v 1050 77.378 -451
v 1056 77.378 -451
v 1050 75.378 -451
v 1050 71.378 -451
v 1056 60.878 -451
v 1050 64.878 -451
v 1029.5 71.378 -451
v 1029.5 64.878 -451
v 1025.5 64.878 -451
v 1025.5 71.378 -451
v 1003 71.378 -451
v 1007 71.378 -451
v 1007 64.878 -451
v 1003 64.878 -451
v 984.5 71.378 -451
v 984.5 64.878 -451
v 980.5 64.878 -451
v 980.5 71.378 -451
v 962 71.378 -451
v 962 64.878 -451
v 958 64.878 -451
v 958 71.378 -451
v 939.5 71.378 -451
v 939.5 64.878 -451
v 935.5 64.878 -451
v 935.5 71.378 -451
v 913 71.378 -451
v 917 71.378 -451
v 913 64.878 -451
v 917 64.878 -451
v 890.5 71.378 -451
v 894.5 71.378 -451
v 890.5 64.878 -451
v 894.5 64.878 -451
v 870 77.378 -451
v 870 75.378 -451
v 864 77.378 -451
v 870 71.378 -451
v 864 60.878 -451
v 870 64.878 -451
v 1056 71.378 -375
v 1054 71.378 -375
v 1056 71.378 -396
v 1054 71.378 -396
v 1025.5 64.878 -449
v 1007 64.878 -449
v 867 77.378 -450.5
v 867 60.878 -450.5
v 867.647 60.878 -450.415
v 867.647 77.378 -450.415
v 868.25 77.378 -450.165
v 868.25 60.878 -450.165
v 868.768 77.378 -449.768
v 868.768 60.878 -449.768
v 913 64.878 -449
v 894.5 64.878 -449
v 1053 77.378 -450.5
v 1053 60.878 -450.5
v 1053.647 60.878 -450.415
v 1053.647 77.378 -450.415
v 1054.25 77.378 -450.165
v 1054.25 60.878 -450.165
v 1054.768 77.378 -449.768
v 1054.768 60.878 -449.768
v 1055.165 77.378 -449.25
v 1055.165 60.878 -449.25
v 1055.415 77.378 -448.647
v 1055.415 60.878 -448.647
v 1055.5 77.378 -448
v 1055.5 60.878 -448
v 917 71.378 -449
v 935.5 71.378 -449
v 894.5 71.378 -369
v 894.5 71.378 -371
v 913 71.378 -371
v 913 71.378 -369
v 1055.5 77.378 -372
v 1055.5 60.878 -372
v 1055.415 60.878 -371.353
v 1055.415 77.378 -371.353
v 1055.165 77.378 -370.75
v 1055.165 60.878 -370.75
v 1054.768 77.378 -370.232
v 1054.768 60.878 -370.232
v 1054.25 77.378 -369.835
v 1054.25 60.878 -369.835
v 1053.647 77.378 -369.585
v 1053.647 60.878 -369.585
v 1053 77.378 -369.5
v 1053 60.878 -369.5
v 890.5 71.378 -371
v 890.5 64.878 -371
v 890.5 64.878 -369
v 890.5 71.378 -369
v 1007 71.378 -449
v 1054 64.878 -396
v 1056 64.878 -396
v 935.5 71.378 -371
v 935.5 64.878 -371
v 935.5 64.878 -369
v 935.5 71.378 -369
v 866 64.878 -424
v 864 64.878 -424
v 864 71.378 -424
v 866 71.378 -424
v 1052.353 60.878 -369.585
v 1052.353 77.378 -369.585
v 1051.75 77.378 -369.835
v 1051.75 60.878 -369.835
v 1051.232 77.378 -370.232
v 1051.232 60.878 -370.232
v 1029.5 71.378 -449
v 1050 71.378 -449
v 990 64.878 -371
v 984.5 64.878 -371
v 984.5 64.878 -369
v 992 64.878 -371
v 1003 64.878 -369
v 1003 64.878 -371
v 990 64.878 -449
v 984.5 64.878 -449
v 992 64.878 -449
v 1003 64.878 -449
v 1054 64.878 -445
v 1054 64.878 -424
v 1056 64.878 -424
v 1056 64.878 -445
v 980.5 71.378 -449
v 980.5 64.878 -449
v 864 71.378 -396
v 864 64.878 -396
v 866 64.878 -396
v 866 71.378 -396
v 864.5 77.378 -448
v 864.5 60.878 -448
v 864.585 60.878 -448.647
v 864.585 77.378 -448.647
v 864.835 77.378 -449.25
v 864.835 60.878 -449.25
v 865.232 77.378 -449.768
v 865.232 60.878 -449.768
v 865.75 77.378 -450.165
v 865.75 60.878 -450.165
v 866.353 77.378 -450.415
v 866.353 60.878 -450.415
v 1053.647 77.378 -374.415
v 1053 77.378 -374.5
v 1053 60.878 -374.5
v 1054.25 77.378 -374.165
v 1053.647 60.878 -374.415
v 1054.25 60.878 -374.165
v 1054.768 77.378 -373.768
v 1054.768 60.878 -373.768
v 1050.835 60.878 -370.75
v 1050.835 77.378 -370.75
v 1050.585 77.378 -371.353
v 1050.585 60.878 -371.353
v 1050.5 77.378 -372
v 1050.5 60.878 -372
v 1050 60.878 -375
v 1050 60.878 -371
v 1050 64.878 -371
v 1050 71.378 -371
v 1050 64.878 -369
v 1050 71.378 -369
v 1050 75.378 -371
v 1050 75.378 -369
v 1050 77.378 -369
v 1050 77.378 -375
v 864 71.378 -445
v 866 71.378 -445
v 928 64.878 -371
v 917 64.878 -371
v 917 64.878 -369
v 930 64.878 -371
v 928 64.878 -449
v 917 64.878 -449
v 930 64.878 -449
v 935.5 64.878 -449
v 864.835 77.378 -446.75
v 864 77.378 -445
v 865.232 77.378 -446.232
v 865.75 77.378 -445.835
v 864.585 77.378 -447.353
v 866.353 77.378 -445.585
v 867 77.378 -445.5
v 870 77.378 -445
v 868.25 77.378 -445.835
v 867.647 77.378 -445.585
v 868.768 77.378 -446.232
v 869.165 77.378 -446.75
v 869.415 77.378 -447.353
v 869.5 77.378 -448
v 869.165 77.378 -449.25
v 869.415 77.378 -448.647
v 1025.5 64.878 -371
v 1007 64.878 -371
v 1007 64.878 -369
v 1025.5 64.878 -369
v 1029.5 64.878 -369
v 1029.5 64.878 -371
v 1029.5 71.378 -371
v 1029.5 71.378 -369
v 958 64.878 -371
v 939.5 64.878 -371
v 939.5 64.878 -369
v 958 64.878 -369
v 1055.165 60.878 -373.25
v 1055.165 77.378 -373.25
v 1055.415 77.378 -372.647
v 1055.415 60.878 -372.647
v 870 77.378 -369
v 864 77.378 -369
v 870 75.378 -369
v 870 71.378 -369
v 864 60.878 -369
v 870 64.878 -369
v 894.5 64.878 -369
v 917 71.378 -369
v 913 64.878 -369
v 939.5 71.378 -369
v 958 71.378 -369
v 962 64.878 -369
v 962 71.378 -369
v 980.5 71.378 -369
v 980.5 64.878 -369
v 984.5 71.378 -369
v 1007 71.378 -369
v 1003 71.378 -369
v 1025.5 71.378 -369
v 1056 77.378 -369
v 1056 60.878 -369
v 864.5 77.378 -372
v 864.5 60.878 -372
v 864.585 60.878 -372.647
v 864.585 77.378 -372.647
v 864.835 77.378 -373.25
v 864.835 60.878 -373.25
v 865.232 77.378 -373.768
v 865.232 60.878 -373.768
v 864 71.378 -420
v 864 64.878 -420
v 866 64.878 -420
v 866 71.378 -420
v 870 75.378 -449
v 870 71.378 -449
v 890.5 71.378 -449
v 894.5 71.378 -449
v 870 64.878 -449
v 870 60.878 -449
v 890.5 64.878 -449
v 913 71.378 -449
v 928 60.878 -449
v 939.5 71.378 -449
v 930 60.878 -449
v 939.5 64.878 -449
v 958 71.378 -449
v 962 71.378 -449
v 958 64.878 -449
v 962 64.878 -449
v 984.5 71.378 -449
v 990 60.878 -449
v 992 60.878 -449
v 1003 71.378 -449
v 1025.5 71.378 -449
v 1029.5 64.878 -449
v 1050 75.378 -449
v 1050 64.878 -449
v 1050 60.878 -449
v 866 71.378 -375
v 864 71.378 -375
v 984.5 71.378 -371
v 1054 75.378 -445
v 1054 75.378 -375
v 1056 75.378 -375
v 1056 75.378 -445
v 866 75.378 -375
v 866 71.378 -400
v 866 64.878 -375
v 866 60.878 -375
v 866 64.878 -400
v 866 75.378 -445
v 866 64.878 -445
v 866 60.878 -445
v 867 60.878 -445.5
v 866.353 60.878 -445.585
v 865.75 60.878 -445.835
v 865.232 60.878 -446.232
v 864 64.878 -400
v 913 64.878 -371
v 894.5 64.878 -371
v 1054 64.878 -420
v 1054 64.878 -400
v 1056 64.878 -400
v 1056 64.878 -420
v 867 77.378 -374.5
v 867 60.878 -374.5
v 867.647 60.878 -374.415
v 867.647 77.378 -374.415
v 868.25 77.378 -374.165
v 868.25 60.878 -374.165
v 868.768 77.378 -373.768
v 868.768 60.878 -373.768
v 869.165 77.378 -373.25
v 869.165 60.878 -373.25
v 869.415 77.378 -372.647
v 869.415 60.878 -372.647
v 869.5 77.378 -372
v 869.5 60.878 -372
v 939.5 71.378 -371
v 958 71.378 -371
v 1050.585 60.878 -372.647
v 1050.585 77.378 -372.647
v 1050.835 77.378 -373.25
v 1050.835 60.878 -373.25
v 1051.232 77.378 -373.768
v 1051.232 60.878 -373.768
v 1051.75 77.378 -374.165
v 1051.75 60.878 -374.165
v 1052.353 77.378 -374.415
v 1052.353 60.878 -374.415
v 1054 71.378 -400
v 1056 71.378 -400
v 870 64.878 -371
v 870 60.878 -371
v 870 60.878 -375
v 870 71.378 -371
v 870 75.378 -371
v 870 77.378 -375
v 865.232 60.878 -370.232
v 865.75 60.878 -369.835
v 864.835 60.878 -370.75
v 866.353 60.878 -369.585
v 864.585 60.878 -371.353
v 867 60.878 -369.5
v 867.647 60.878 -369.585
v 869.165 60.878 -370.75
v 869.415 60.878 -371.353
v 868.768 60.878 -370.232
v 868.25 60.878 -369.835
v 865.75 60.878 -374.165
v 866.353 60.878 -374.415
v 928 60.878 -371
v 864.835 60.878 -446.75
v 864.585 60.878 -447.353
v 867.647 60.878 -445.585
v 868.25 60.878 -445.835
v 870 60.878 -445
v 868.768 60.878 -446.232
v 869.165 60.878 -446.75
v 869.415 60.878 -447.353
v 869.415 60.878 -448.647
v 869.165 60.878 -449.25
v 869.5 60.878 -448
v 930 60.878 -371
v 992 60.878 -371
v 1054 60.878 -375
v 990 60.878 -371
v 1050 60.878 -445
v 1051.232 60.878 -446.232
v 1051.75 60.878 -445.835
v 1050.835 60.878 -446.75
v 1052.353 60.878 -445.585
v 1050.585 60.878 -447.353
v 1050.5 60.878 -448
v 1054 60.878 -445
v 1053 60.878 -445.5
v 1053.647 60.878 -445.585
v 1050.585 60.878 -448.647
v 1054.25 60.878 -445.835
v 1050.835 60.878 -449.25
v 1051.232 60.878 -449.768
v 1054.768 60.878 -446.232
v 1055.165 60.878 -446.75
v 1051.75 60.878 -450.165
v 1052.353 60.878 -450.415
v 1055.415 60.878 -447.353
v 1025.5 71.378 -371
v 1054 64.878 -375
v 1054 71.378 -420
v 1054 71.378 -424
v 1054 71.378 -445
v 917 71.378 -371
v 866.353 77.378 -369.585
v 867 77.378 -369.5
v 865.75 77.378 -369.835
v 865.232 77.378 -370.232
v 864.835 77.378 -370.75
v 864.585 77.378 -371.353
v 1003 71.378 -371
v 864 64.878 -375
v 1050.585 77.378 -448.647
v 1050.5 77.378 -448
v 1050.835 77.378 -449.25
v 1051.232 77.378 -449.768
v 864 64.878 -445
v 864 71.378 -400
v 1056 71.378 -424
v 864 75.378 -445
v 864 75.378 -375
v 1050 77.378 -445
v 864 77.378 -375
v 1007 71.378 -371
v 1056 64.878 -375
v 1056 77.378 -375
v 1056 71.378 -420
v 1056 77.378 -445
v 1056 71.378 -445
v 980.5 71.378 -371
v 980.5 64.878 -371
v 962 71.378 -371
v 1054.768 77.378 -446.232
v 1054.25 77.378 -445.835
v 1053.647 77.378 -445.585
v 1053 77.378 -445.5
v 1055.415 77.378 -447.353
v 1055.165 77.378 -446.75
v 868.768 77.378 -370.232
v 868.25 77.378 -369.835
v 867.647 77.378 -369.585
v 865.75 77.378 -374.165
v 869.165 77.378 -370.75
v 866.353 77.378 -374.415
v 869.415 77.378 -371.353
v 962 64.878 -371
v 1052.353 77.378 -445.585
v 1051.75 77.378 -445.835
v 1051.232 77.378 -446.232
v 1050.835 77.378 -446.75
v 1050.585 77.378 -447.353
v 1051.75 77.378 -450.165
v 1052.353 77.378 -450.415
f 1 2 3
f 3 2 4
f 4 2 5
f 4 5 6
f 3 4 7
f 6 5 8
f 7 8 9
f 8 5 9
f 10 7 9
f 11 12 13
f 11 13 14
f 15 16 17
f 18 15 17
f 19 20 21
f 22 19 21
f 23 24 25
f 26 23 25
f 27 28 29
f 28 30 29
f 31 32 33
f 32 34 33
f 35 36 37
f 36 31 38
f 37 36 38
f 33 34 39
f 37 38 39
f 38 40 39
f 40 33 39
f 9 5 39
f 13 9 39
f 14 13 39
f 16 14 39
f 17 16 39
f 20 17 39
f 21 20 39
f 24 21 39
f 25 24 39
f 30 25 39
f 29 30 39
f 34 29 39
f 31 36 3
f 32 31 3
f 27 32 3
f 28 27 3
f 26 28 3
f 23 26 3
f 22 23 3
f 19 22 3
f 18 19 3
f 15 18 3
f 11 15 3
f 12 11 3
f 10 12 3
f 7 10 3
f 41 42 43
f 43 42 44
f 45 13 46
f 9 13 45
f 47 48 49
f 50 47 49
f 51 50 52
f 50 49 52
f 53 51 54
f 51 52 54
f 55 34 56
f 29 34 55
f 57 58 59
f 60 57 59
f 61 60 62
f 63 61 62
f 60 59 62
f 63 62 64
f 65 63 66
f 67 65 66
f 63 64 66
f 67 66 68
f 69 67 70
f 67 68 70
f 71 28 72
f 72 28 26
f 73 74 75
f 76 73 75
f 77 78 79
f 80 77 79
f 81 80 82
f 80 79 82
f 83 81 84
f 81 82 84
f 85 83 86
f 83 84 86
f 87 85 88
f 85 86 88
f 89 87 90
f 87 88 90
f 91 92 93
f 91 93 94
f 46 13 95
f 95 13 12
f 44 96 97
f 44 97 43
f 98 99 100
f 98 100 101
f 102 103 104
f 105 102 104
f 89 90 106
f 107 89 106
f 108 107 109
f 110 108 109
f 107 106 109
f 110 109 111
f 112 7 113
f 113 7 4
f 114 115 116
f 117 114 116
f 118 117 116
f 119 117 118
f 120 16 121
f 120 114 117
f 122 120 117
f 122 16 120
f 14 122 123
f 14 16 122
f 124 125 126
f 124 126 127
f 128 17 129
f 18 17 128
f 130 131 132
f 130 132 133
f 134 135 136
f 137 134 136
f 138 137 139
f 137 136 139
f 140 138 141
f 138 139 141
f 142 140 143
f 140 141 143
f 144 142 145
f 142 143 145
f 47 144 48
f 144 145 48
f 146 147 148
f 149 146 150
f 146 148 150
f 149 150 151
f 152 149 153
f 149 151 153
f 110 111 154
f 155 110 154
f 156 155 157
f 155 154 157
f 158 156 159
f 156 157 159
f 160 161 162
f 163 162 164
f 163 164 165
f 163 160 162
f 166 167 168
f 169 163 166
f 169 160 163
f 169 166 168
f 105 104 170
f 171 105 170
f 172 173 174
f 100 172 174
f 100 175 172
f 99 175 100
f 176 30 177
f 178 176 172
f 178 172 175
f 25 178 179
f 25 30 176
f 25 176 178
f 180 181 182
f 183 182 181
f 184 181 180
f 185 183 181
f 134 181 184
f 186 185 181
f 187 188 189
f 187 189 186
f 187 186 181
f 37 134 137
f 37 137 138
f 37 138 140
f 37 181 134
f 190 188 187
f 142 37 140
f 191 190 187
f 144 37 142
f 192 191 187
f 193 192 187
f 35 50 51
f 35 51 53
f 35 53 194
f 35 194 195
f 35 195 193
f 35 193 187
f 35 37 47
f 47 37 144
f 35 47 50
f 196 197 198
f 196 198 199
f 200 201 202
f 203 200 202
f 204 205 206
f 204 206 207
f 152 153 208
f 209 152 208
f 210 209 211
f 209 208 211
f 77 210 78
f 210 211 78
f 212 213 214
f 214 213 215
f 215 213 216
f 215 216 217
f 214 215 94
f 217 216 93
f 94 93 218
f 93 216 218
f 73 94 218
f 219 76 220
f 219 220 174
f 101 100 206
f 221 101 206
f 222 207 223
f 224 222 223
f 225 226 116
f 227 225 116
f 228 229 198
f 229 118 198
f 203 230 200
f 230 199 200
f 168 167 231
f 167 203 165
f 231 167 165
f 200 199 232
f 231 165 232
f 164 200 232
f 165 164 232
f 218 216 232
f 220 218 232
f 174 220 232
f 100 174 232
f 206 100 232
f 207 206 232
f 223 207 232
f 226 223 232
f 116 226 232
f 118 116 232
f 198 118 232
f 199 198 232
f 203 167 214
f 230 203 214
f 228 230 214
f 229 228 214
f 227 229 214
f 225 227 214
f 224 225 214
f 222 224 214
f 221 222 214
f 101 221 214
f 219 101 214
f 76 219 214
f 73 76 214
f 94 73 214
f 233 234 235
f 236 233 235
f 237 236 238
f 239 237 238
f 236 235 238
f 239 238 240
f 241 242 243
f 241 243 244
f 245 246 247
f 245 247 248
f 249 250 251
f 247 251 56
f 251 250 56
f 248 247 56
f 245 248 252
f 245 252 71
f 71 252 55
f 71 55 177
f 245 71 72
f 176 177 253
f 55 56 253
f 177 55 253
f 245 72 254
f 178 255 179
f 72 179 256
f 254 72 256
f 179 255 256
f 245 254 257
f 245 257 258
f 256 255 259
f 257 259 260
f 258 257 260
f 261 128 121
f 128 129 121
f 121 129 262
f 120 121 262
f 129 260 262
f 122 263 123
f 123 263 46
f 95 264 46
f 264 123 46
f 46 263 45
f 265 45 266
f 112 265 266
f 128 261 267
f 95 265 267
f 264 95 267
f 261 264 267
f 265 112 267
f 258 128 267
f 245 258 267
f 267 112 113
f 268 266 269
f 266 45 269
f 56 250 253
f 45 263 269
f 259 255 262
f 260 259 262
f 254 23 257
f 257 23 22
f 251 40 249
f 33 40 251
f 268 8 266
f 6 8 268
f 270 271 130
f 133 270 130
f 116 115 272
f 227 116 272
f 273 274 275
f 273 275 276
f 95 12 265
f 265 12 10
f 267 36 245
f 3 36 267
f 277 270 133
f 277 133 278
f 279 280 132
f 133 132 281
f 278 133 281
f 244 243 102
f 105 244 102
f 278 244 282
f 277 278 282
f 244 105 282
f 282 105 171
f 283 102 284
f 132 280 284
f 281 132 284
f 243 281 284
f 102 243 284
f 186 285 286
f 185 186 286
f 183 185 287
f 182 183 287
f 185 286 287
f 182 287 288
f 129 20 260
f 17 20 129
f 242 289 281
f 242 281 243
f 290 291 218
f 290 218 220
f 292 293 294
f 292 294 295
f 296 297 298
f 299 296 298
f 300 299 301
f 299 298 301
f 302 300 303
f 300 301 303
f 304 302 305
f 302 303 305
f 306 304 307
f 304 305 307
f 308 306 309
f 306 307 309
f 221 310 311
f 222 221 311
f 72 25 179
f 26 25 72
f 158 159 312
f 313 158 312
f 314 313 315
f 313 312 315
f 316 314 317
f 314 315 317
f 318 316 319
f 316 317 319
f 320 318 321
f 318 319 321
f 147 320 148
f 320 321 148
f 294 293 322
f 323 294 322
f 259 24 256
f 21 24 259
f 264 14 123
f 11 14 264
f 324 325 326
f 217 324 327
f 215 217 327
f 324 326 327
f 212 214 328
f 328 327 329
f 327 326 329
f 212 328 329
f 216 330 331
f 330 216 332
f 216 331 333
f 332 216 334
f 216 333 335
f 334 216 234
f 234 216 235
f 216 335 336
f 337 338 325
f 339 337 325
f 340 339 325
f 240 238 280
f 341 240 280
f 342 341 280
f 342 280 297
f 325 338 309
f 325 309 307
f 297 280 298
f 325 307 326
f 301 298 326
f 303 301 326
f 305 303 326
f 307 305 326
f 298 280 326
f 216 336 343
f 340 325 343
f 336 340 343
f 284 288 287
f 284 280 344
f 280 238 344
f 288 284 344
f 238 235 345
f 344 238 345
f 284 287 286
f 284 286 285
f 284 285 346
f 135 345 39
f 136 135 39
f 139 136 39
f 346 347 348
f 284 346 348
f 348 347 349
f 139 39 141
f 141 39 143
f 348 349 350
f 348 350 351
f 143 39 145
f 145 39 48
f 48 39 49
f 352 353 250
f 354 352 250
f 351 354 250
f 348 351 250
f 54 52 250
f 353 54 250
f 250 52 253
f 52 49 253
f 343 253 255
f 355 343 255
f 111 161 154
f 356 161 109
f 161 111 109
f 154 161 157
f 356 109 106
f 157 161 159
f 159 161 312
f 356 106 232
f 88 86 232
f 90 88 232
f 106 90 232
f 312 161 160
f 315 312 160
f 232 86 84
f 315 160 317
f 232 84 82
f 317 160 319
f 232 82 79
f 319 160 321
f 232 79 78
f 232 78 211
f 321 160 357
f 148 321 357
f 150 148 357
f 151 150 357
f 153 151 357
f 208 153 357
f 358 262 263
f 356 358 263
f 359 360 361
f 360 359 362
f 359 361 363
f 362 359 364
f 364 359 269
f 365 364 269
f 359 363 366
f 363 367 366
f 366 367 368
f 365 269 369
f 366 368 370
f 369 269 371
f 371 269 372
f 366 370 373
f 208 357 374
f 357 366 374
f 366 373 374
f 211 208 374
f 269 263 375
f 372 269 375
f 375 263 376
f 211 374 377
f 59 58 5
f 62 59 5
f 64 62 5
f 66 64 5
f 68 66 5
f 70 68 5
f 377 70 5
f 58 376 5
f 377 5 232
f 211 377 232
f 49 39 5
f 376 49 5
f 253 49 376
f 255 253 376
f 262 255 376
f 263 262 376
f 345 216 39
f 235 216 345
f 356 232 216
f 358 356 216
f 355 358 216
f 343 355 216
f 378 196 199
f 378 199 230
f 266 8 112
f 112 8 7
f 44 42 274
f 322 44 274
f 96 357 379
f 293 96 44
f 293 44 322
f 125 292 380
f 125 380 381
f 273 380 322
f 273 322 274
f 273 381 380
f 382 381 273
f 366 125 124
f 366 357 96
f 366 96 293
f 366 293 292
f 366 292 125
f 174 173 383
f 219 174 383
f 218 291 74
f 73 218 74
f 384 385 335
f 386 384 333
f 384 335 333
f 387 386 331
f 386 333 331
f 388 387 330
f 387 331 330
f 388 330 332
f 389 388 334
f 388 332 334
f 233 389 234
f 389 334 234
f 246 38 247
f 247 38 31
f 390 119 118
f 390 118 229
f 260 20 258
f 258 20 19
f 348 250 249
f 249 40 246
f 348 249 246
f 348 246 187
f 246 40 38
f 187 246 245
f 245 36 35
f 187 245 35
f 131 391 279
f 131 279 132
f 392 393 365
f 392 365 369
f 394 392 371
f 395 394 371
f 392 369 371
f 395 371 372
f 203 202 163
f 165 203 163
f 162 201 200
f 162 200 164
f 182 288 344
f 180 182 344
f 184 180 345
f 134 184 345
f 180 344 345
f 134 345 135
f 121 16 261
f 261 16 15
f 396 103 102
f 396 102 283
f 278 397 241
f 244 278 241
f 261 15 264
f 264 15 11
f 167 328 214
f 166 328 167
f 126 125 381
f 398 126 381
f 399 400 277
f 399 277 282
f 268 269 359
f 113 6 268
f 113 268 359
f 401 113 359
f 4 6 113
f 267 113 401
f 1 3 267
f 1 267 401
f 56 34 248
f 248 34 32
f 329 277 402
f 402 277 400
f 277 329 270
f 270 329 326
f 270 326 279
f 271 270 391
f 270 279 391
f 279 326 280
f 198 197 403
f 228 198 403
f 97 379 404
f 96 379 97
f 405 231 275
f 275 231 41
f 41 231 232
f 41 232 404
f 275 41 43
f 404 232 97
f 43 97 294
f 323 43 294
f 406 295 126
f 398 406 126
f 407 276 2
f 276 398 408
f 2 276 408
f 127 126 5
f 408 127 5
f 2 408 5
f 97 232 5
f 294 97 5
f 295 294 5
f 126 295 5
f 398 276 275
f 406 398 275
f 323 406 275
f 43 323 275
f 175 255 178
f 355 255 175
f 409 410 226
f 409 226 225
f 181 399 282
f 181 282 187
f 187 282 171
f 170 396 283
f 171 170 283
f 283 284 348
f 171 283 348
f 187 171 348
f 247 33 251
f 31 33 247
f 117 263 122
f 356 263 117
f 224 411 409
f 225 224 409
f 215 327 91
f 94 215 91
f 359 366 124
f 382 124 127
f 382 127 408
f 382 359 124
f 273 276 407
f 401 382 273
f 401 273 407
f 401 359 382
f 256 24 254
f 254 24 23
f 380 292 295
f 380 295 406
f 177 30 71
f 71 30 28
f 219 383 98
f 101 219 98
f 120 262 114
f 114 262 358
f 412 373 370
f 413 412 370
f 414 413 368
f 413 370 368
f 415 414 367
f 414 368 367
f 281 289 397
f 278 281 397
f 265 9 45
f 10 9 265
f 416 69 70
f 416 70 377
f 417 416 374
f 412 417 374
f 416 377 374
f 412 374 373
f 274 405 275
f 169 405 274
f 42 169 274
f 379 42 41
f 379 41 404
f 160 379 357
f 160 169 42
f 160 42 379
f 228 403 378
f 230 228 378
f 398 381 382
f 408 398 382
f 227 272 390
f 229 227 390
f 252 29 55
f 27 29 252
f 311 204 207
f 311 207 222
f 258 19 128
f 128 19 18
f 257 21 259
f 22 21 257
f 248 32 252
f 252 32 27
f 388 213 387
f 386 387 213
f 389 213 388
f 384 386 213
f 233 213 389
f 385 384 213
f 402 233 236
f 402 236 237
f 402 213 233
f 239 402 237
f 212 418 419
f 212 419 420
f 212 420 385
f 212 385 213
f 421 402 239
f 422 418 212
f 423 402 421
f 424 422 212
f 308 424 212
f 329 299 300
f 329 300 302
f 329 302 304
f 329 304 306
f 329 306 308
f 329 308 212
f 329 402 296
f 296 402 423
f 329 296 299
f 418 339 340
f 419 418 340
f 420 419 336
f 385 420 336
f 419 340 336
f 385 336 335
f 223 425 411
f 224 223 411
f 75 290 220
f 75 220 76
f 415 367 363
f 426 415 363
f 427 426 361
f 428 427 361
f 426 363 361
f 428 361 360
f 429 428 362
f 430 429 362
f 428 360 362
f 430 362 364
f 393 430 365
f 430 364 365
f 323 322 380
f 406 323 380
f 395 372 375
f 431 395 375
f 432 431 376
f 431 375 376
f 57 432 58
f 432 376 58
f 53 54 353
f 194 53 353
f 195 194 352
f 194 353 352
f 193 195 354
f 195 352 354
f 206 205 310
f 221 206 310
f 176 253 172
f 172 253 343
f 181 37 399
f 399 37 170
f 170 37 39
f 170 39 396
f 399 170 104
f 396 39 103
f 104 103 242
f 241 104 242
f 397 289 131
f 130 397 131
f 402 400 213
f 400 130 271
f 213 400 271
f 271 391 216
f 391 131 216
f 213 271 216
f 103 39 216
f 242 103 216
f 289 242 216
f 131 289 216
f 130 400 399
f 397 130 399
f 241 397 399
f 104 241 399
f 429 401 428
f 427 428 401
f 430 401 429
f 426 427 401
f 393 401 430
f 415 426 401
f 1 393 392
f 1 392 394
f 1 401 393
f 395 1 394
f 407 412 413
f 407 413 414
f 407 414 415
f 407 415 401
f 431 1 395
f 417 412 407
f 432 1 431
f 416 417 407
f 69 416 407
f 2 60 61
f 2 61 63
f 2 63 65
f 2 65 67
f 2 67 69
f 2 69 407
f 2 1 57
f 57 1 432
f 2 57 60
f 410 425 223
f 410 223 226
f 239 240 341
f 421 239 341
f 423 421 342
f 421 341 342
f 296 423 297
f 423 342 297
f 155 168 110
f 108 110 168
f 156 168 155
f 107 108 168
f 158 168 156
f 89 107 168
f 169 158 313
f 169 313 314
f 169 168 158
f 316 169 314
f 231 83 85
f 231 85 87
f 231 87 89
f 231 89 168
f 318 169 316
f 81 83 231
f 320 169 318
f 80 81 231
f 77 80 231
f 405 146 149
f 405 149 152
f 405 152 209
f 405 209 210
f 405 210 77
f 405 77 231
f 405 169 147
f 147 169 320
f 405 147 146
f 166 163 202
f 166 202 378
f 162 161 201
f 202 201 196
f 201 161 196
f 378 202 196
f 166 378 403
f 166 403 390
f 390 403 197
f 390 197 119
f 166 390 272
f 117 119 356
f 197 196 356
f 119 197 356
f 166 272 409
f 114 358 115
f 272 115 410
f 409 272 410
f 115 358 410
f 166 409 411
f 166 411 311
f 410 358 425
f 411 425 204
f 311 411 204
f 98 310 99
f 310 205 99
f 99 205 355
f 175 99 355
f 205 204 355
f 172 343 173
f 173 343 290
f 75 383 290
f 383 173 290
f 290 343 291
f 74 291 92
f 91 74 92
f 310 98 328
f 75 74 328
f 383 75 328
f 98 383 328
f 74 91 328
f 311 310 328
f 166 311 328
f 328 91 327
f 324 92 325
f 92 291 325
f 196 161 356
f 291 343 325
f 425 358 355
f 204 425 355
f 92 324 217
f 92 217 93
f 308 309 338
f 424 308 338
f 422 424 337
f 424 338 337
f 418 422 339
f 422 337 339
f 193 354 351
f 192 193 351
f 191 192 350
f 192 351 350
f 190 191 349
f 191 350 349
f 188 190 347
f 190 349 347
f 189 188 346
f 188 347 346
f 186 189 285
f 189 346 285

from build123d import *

# Parameters (mm, degrees)
SKETCH1_W               = 900
SKETCH1_H               = 20
SKETCH1_W_2             = 20
SKETCH1_H_2             = 350
SKETCH1_H_3             = 700
BOSS_EXTRUDE1_DEPTH     = 165
CUT_EXTRUDE1_DEPTH      = 2095.283887156
CUT_EXTRUDE1_DEPTH_BACK = 2095.283887156
SKETCH2_W               = 205
SKETCH2_H               = 65
SKETCH2_W_2             = 185
SKETCH2_W_3             = 1800
SKETCH2_H_2             = 20
CUT_EXTRUDE2_DEPTH      = 2095.283887156
CUT_EXTRUDE2_DEPTH_BACK = 2095.283887156
SKETCH3_W               = 200
SKETCH3_H               = 65
SKETCH3_W_2             = 210
SKETCH5_W               = 20
SKETCH5_H               = 780
BOSS_EXTRUDE3_DEPTH     = 40
SCALE2_SCALE            = 0.1


with BuildPart() as part:
    # Sketch1 → Boss-Extrude1 (new body)
    with BuildSketch(Plane(origin=(0, 0, 0), x_dir=(1, 0, 0), z_dir=(0, 1, 0))):
        Polygon((5, 815), (0, 815), (0, 765), (5, 765), (5, 790), align=None)
        with BuildLine():
            Line((5, 790), (5, 765))
            Line((5, 765), (12.32233047, 772.32233047))
            ThreePointArc((12.32233047, 772.32233047), (6.903011687, 780.432914191), (5, 790))
        make_face()
        with BuildLine():
            Line((12.32233047, 772.32233047), (5, 765))
            Line((5, 765), (30, 765))
            ThreePointArc((30, 765), (20.432914191, 766.903011687), (12.32233047, 772.32233047))
        make_face()
        Polygon((5, 765), (0, 765), (0, 760), align=None)
        Polygon((5, 765), (0, 760), (20, 760), (60, 760), (60, 765), (55, 765), (30, 765), align=None)
        with BuildLine():
            Line((55, 765), (55, 790))
            ThreePointArc((55, 790), (47.67766953, 772.32233047), (30, 765))
            Line((30, 765), (55, 765))
        make_face()
        Polygon((60, 800), (60, 820), (55, 815), (55, 790), (55, 765), (60, 765), align=None)
        with BuildLine():
            Line((30, 815), (5, 815))
            Line((5, 815), (5, 790))
            ThreePointArc((5, 790), (12.32233047, 807.67766953), (30, 815))
        make_face()
        Polygon((55, 820), (0, 820), (0, 815), (5, 815), (30, 815), (55, 815), align=None)
        with BuildLine():
            Line((47.67766953, 807.67766953), (55, 815))
            Line((55, 815), (30, 815))
            ThreePointArc((30, 815), (39.567085809, 813.096988313), (47.67766953, 807.67766953))
        make_face()
        with BuildLine():
            Line((55, 790), (55, 815))
            Line((55, 815), (47.67766953, 807.67766953))
            ThreePointArc((47.67766953, 807.67766953), (53.096988313, 799.567085809), (55, 790))
        make_face()
        Polygon((60, 820), (55, 820), (55, 815), align=None)
        with Locations((510, 810)):
            Rectangle(SKETCH1_W, SKETCH1_H)
        with Locations((10, 585)):
            Rectangle(SKETCH1_W_2, SKETCH1_H_2)
        with Locations((10, 235)):
            Rectangle(SKETCH1_W_2, SKETCH1_H_2)
        Polygon((5, 55), (0, 60), (0, 55), align=None)
        Polygon((5, 55), (0, 55), (0, 5), (5, 5), (5, 30), align=None)
        Polygon((20, 60), (0, 60), (5, 55), (30, 55), (55, 55), (60, 55), (60, 60), align=None)
        with BuildLine():
            Line((30, 55), (5, 55))
            Line((5, 55), (12.32233047, 47.67766953))
            ThreePointArc((12.32233047, 47.67766953), (20.432914191, 53.096988313), (30, 55))
        make_face()
        with BuildLine():
            Line((12.32233047, 47.67766953), (5, 55))
            Line((5, 55), (5, 30))
            ThreePointArc((5, 30), (6.903011687, 39.567085809), (12.32233047, 47.67766953))
        make_face()
        with BuildLine():
            Line((55, 55), (30, 55))
            ThreePointArc((30, 55), (47.67766953, 47.67766953), (55, 30))
            Line((55, 30), (55, 55))
        make_face()
        Polygon((60, 0), (60, 20), (60, 55), (55, 55), (55, 30), (55, 5), align=None)
        with BuildLine():
            Line((55, 5), (47.67766953, 12.32233047))
            ThreePointArc((47.67766953, 12.32233047), (39.567085809, 6.903011687), (30, 5))
            Line((30, 5), (55, 5))
        make_face()
        with BuildLine():
            ThreePointArc((55, 30), (53.096988313, 20.432914191), (47.67766953, 12.32233047))
            Line((47.67766953, 12.32233047), (55, 5))
            Line((55, 5), (55, 30))
        make_face()
        Polygon((5, 5), (0, 5), (0, 0), (55, 0), (55, 5), (30, 5), align=None)
        Polygon((55, 0), (60, 0), (55, 5), align=None)
        with BuildLine():
            ThreePointArc((30, 5), (12.32233047, 12.32233047), (5, 30))
            Line((5, 30), (5, 5))
            Line((5, 5), (30, 5))
        make_face()
        with Locations((510, 10)):
            Rectangle(SKETCH1_W, SKETCH1_H)
        with Locations((1410, 10)):
            Rectangle(SKETCH1_W, SKETCH1_H)
        Polygon((1860, 55), (1860, 20), (1860, 0), (1865, 5), (1865, 30), (1865, 55), align=None)
        with BuildLine():
            Line((1865, 30), (1865, 5))
            Line((1865, 5), (1872.32233047, 12.32233047))
            ThreePointArc((1872.32233047, 12.32233047), (1866.903011687, 20.432914191), (1865, 30))
        make_face()
        with BuildLine():
            Line((1872.32233047, 12.32233047), (1865, 5))
            Line((1865, 5), (1890, 5))
            ThreePointArc((1890, 5), (1880.432914191, 6.903011687), (1872.32233047, 12.32233047))
        make_face()
        Polygon((1865, 5), (1860, 0), (1865, 0), align=None)
        Polygon((1865, 5), (1865, 0), (1920, 0), (1920, 5), (1915, 5), (1890, 5), align=None)
        with BuildLine():
            ThreePointArc((1915, 30), (1907.67766953, 12.32233047), (1890, 5))
            Line((1890, 5), (1915, 5))
            Line((1915, 5), (1915, 30))
        make_face()
        Polygon((1920, 5), (1920, 55), (1915, 55), (1915, 30), (1915, 5), align=None)
        Polygon((1860, 60), (1860, 55), (1865, 55), (1890, 55), (1915, 55), (1920, 60), (1900, 60), align=None)
        with BuildLine():
            Line((1890, 55), (1865, 55))
            Line((1865, 55), (1865, 30))
            ThreePointArc((1865, 30), (1872.32233047, 47.67766953), (1890, 55))
        make_face()
        with BuildLine():
            Line((1915, 55), (1890, 55))
            ThreePointArc((1890, 55), (1899.567085809, 53.096988313), (1907.67766953, 47.67766953))
            Line((1907.67766953, 47.67766953), (1915, 55))
        make_face()
        Polygon((1920, 55), (1920, 60), (1915, 55), align=None)
        with BuildLine():
            Line((1915, 30), (1915, 55))
            Line((1915, 55), (1907.67766953, 47.67766953))
            ThreePointArc((1907.67766953, 47.67766953), (1913.096988313, 39.567085809), (1915, 30))
        make_face()
        with Locations((1910, 410)):
            Rectangle(SKETCH1_W_2, SKETCH1_H_3)
        Polygon((1865, 765), (1860, 765), (1860, 760), (1900, 760), (1920, 760), (1915, 765), (1890, 765), align=None)
        Polygon((1920, 760), (1920, 765), (1915, 765), align=None)
        with BuildLine():
            ThreePointArc((1915, 790), (1913.096988313, 780.432914191), (1907.67766953, 772.32233047))
            Line((1907.67766953, 772.32233047), (1915, 765))
            Line((1915, 765), (1915, 790))
        make_face()
        with BuildLine():
            Line((1915, 765), (1907.67766953, 772.32233047))
            ThreePointArc((1907.67766953, 772.32233047), (1899.567085809, 766.903011687), (1890, 765))
            Line((1890, 765), (1915, 765))
        make_face()
        Polygon((1920, 765), (1920, 815), (1915, 815), (1915, 790), (1915, 765), align=None)
        Polygon((1920, 820), (1865, 820), (1865, 815), (1890, 815), (1915, 815), (1920, 815), align=None)
        with BuildLine():
            Line((1915, 815), (1890, 815))
            ThreePointArc((1890, 815), (1907.67766953, 807.67766953), (1915, 790))
            Line((1915, 790), (1915, 815))
        make_face()
        Polygon((1865, 820), (1860, 820), (1865, 815), align=None)
        Polygon((1865, 815), (1860, 820), (1860, 800), (1860, 765), (1865, 765), (1865, 790), align=None)
        with BuildLine():
            Line((1872.32233047, 807.67766953), (1865, 815))
            Line((1865, 815), (1865, 790))
            ThreePointArc((1865, 790), (1866.903011687, 799.567085809), (1872.32233047, 807.67766953))
        make_face()
        with BuildLine():
            Line((1890, 815), (1865, 815))
            Line((1865, 815), (1872.32233047, 807.67766953))
            ThreePointArc((1872.32233047, 807.67766953), (1880.432914191, 813.096988313), (1890, 815))
        make_face()
        with BuildLine():
            ThreePointArc((1890, 765), (1872.32233047, 772.32233047), (1865, 790))
            Line((1865, 790), (1865, 765))
            Line((1865, 765), (1890, 765))
        make_face()
        with Locations((1410, 810)):
            Rectangle(SKETCH1_W, SKETCH1_H)
    extrude(amount=BOSS_EXTRUDE1_DEPTH)

    # Sketch2 → Cut-Extrude1 (cut, two sides: drawn at the far end of the back side and taken through both)
    with BuildSketch(Plane.XY.offset(-CUT_EXTRUDE1_DEPTH_BACK)):
        with Locations((162.5, 72.5)):
            Rectangle(SKETCH2_W, SKETCH2_H)
        with Locations((397.5, 72.5)):
            Rectangle(SKETCH2_W_2, SKETCH2_H)
        with Locations((622.5, 72.5)):
            Rectangle(SKETCH2_W_2, SKETCH2_H)
        with Locations((847.5, 72.5)):
            Rectangle(SKETCH2_W_2, SKETCH2_H)
        with Locations((1072.5, 72.5)):
            Rectangle(SKETCH2_W_2, SKETCH2_H)
        with Locations((1297.5, 72.5)):
            Rectangle(SKETCH2_W_2, SKETCH2_H)
        with Locations((1522.5, 72.5)):
            Rectangle(SKETCH2_W_2, SKETCH2_H)
        with Locations((1757.5, 72.5)):
            Rectangle(SKETCH2_W, SKETCH2_H)
        with Locations((960, 155)):
            Rectangle(SKETCH2_W_3, SKETCH2_H_2)
    extrude(amount=CUT_EXTRUDE1_DEPTH + CUT_EXTRUDE1_DEPTH_BACK, mode=Mode.SUBTRACT)

    # Sketch3 → Cut-Extrude2 (cut, two sides: drawn at the far end of the back side and taken through both)
    with BuildSketch(Plane(origin=(1920, 0, 0), x_dir=(0, 0, -1), z_dir=(1, 0, 0)).offset(-CUT_EXTRUDE2_DEPTH_BACK)):
        Polygon((410, 145), (410, 165), (60, 165), (60, 145), (270, 145), (310, 145), align=None)
        Polygon((760, 145), (760, 165), (410, 165), (410, 145), (510, 145), (550, 145), align=None)
        with Locations((410, 72.5)):
            Rectangle(SKETCH3_W, SKETCH3_H)
        with Locations((655, 72.5)):
            Rectangle(SKETCH3_W_2, SKETCH3_H)
        with Locations((165, 72.5)):
            Rectangle(SKETCH3_W_2, SKETCH3_H)
    extrude(amount=CUT_EXTRUDE2_DEPTH + CUT_EXTRUDE2_DEPTH_BACK, mode=Mode.SUBTRACT)

    # Sketch5 → Boss-Extrude3 (add)
    with BuildSketch(Plane.XZ):
        with Locations((650, -410)):
            Rectangle(SKETCH5_W, SKETCH5_H)
        with Locations((1270, -410)):
            Rectangle(SKETCH5_W, SKETCH5_H)
    extrude(amount=-BOSS_EXTRUDE3_DEPTH)


with BuildPart() as part_1:
    # Scale2: scaled about (960, 67.642168167, -410)
    add(part.part.scale(SCALE2_SCALE).moved(Location((864, 60.87795135, -369))))


solid = part_1.part
